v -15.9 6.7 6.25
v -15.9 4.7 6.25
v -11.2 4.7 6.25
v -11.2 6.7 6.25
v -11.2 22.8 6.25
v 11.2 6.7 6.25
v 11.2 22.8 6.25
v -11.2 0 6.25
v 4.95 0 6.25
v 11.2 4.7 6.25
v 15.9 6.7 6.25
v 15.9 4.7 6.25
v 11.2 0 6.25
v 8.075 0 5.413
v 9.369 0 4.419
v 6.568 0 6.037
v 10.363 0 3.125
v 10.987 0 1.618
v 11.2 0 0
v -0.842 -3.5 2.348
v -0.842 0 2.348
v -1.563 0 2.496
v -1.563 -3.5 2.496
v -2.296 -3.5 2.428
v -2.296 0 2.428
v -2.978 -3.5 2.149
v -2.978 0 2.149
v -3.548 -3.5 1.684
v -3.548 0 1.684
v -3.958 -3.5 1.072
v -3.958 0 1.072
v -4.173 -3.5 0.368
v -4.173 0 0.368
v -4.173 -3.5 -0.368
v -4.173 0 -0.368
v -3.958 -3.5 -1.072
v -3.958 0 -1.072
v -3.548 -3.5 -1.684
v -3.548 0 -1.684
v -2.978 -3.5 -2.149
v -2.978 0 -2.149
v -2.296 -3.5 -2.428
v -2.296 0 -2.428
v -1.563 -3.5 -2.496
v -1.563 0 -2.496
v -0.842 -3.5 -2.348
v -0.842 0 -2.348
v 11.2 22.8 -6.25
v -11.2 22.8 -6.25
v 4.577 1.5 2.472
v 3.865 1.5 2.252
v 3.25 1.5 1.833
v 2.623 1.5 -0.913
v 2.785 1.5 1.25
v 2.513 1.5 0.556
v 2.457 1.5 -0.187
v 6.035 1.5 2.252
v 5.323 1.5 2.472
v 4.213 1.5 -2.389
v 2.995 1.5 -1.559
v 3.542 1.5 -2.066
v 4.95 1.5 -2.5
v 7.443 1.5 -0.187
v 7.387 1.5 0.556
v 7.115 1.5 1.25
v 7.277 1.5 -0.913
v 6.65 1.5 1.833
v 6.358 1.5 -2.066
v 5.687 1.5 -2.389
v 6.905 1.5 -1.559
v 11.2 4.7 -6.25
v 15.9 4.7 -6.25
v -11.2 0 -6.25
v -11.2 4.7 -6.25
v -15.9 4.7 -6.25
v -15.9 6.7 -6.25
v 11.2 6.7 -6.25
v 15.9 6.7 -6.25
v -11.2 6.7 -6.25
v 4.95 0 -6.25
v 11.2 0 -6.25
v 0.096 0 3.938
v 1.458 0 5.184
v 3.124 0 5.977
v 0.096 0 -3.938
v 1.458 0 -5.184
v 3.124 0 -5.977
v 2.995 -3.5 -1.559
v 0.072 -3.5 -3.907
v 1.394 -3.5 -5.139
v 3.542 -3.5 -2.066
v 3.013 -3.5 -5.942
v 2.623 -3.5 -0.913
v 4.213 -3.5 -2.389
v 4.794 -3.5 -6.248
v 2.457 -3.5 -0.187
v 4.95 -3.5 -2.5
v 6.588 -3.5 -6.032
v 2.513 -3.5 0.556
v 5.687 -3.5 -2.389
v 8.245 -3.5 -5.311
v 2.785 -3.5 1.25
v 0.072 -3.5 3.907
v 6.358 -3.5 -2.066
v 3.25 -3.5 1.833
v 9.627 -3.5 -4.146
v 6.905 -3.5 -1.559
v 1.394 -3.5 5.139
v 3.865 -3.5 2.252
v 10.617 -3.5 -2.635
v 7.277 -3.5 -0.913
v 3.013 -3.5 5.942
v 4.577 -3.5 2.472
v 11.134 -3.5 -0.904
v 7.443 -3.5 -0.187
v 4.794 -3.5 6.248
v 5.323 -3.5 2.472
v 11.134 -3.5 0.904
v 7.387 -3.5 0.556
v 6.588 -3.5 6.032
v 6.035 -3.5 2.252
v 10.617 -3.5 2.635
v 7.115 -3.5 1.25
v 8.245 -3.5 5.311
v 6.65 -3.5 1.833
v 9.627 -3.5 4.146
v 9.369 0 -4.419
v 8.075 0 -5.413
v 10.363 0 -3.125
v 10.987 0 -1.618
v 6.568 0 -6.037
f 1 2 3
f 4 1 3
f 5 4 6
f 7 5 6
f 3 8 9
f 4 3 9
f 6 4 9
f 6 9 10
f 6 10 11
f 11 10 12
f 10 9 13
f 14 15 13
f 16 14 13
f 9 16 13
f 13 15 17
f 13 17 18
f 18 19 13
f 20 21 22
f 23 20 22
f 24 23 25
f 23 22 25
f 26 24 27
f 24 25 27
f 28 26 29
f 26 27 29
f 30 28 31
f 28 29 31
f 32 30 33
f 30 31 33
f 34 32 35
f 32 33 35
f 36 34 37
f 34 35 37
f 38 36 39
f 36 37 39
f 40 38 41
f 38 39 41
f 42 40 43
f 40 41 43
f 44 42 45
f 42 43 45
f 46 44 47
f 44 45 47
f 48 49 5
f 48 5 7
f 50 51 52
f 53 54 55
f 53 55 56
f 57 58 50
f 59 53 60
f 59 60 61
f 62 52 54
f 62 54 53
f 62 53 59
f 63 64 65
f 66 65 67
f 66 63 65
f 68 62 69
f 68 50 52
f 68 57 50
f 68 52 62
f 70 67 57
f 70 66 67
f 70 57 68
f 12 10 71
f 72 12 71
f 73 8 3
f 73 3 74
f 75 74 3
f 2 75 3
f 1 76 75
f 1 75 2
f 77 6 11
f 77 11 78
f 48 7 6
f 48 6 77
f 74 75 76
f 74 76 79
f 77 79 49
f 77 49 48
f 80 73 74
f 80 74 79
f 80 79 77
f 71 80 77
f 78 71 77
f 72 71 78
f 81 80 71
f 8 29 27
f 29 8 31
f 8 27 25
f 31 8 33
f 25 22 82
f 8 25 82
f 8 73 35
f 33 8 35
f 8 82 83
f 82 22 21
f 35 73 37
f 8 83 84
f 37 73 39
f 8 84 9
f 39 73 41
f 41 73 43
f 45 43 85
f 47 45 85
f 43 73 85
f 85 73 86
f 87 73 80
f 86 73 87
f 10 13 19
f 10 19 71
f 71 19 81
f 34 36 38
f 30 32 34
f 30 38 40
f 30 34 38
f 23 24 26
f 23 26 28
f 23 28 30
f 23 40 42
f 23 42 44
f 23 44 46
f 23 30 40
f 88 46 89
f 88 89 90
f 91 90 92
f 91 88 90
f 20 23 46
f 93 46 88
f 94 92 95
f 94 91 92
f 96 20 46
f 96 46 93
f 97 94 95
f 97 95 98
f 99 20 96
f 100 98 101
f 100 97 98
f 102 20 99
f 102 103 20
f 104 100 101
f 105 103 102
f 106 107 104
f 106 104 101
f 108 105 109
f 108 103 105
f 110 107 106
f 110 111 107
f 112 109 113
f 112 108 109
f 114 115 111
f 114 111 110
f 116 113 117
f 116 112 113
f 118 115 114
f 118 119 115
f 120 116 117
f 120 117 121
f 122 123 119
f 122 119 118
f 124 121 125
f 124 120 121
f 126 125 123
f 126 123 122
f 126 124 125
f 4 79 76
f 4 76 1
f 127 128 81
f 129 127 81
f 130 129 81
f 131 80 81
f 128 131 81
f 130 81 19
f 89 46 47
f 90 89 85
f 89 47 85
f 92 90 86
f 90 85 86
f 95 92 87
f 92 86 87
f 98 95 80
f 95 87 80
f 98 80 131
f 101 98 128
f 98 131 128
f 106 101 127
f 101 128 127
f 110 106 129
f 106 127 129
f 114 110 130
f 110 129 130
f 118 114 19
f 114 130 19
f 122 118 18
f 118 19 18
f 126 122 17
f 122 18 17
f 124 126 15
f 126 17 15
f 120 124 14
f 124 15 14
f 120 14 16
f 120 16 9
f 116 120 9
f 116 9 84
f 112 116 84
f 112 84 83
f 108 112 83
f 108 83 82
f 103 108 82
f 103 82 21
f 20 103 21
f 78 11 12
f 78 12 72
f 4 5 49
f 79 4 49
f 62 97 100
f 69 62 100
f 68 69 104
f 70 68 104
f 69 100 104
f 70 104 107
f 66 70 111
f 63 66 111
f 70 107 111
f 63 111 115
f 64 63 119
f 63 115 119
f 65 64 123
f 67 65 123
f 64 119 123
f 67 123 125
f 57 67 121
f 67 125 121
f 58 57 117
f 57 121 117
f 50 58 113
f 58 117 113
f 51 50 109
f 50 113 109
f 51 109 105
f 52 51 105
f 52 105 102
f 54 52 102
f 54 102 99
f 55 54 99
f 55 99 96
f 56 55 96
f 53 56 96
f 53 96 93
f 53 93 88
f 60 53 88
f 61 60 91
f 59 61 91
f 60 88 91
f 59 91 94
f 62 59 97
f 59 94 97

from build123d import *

# Parameters (mm, degrees)
SKETCH1_W           = 22.4
SKETCH1_H           = 12.5
BOSS_EXTRUDE1_DEPTH = 22.8
SKETCH2_W           = 12.5
SKETCH2_H           = 2
BOSS_EXTRUDE2_DEPTH = 4.7
SKETCH3_W           = 12.5
SKETCH3_H           = 2
BOSS_EXTRUDE3_DEPTH = 4.7
BOSS_EXTRUDE5_DEPTH = 3.5
SKETCH5_R           = 2.5
CUT_EXTRUDE1_DEPTH  = 5


with BuildPart() as part:
    # Sketch1 → Boss-Extrude1 (new body)
    with BuildSketch(Plane(origin=(0, 0, 0), x_dir=(1, 0, 0), z_dir=(0, 1, 0))):
        Rectangle(SKETCH1_W, SKETCH1_H)
    extrude(amount=BOSS_EXTRUDE1_DEPTH)

    # Sketch2 → Boss-Extrude2 (add)
    with BuildSketch(Plane(origin=(11.2, 0, 0), x_dir=(0, 0, -1), z_dir=(1, 0, 0))):
        with Locations((0, 5.7)):
            Rectangle(SKETCH2_W, SKETCH2_H)
    extrude(amount=BOSS_EXTRUDE2_DEPTH)

    # Sketch3 → Boss-Extrude3 (add)
    with BuildSketch(Plane.ZY.offset(11.2)):
        with Locations((0, 5.7)):
            Rectangle(SKETCH3_W, SKETCH3_H)
    extrude(amount=BOSS_EXTRUDE3_DEPTH)

    # Sketch4 → Boss-Extrude5 (add)
    with BuildSketch(Plane.XZ):
        with BuildLine():
            ThreePointArc((-0.842105263, -2.348194332), (11.2, 0), (-0.842105263, 2.348194332))
            ThreePointArc((-0.842105263, 2.348194332), (-4.2, 0), (-0.842105263, -2.348194332))
        make_face()
    extrude(amount=BOSS_EXTRUDE5_DEPTH)

    # Sketch5 → Cut-Extrude1 (cut)
    with BuildSketch(Plane.XZ.offset(3.5)):
        with Locations(Location((4.95, 0, 0), (0, 0, 270))):
            Circle(SKETCH5_R)
    extrude(amount=-CUT_EXTRUDE1_DEPTH, mode=Mode.SUBTRACT)


solid = part.part
